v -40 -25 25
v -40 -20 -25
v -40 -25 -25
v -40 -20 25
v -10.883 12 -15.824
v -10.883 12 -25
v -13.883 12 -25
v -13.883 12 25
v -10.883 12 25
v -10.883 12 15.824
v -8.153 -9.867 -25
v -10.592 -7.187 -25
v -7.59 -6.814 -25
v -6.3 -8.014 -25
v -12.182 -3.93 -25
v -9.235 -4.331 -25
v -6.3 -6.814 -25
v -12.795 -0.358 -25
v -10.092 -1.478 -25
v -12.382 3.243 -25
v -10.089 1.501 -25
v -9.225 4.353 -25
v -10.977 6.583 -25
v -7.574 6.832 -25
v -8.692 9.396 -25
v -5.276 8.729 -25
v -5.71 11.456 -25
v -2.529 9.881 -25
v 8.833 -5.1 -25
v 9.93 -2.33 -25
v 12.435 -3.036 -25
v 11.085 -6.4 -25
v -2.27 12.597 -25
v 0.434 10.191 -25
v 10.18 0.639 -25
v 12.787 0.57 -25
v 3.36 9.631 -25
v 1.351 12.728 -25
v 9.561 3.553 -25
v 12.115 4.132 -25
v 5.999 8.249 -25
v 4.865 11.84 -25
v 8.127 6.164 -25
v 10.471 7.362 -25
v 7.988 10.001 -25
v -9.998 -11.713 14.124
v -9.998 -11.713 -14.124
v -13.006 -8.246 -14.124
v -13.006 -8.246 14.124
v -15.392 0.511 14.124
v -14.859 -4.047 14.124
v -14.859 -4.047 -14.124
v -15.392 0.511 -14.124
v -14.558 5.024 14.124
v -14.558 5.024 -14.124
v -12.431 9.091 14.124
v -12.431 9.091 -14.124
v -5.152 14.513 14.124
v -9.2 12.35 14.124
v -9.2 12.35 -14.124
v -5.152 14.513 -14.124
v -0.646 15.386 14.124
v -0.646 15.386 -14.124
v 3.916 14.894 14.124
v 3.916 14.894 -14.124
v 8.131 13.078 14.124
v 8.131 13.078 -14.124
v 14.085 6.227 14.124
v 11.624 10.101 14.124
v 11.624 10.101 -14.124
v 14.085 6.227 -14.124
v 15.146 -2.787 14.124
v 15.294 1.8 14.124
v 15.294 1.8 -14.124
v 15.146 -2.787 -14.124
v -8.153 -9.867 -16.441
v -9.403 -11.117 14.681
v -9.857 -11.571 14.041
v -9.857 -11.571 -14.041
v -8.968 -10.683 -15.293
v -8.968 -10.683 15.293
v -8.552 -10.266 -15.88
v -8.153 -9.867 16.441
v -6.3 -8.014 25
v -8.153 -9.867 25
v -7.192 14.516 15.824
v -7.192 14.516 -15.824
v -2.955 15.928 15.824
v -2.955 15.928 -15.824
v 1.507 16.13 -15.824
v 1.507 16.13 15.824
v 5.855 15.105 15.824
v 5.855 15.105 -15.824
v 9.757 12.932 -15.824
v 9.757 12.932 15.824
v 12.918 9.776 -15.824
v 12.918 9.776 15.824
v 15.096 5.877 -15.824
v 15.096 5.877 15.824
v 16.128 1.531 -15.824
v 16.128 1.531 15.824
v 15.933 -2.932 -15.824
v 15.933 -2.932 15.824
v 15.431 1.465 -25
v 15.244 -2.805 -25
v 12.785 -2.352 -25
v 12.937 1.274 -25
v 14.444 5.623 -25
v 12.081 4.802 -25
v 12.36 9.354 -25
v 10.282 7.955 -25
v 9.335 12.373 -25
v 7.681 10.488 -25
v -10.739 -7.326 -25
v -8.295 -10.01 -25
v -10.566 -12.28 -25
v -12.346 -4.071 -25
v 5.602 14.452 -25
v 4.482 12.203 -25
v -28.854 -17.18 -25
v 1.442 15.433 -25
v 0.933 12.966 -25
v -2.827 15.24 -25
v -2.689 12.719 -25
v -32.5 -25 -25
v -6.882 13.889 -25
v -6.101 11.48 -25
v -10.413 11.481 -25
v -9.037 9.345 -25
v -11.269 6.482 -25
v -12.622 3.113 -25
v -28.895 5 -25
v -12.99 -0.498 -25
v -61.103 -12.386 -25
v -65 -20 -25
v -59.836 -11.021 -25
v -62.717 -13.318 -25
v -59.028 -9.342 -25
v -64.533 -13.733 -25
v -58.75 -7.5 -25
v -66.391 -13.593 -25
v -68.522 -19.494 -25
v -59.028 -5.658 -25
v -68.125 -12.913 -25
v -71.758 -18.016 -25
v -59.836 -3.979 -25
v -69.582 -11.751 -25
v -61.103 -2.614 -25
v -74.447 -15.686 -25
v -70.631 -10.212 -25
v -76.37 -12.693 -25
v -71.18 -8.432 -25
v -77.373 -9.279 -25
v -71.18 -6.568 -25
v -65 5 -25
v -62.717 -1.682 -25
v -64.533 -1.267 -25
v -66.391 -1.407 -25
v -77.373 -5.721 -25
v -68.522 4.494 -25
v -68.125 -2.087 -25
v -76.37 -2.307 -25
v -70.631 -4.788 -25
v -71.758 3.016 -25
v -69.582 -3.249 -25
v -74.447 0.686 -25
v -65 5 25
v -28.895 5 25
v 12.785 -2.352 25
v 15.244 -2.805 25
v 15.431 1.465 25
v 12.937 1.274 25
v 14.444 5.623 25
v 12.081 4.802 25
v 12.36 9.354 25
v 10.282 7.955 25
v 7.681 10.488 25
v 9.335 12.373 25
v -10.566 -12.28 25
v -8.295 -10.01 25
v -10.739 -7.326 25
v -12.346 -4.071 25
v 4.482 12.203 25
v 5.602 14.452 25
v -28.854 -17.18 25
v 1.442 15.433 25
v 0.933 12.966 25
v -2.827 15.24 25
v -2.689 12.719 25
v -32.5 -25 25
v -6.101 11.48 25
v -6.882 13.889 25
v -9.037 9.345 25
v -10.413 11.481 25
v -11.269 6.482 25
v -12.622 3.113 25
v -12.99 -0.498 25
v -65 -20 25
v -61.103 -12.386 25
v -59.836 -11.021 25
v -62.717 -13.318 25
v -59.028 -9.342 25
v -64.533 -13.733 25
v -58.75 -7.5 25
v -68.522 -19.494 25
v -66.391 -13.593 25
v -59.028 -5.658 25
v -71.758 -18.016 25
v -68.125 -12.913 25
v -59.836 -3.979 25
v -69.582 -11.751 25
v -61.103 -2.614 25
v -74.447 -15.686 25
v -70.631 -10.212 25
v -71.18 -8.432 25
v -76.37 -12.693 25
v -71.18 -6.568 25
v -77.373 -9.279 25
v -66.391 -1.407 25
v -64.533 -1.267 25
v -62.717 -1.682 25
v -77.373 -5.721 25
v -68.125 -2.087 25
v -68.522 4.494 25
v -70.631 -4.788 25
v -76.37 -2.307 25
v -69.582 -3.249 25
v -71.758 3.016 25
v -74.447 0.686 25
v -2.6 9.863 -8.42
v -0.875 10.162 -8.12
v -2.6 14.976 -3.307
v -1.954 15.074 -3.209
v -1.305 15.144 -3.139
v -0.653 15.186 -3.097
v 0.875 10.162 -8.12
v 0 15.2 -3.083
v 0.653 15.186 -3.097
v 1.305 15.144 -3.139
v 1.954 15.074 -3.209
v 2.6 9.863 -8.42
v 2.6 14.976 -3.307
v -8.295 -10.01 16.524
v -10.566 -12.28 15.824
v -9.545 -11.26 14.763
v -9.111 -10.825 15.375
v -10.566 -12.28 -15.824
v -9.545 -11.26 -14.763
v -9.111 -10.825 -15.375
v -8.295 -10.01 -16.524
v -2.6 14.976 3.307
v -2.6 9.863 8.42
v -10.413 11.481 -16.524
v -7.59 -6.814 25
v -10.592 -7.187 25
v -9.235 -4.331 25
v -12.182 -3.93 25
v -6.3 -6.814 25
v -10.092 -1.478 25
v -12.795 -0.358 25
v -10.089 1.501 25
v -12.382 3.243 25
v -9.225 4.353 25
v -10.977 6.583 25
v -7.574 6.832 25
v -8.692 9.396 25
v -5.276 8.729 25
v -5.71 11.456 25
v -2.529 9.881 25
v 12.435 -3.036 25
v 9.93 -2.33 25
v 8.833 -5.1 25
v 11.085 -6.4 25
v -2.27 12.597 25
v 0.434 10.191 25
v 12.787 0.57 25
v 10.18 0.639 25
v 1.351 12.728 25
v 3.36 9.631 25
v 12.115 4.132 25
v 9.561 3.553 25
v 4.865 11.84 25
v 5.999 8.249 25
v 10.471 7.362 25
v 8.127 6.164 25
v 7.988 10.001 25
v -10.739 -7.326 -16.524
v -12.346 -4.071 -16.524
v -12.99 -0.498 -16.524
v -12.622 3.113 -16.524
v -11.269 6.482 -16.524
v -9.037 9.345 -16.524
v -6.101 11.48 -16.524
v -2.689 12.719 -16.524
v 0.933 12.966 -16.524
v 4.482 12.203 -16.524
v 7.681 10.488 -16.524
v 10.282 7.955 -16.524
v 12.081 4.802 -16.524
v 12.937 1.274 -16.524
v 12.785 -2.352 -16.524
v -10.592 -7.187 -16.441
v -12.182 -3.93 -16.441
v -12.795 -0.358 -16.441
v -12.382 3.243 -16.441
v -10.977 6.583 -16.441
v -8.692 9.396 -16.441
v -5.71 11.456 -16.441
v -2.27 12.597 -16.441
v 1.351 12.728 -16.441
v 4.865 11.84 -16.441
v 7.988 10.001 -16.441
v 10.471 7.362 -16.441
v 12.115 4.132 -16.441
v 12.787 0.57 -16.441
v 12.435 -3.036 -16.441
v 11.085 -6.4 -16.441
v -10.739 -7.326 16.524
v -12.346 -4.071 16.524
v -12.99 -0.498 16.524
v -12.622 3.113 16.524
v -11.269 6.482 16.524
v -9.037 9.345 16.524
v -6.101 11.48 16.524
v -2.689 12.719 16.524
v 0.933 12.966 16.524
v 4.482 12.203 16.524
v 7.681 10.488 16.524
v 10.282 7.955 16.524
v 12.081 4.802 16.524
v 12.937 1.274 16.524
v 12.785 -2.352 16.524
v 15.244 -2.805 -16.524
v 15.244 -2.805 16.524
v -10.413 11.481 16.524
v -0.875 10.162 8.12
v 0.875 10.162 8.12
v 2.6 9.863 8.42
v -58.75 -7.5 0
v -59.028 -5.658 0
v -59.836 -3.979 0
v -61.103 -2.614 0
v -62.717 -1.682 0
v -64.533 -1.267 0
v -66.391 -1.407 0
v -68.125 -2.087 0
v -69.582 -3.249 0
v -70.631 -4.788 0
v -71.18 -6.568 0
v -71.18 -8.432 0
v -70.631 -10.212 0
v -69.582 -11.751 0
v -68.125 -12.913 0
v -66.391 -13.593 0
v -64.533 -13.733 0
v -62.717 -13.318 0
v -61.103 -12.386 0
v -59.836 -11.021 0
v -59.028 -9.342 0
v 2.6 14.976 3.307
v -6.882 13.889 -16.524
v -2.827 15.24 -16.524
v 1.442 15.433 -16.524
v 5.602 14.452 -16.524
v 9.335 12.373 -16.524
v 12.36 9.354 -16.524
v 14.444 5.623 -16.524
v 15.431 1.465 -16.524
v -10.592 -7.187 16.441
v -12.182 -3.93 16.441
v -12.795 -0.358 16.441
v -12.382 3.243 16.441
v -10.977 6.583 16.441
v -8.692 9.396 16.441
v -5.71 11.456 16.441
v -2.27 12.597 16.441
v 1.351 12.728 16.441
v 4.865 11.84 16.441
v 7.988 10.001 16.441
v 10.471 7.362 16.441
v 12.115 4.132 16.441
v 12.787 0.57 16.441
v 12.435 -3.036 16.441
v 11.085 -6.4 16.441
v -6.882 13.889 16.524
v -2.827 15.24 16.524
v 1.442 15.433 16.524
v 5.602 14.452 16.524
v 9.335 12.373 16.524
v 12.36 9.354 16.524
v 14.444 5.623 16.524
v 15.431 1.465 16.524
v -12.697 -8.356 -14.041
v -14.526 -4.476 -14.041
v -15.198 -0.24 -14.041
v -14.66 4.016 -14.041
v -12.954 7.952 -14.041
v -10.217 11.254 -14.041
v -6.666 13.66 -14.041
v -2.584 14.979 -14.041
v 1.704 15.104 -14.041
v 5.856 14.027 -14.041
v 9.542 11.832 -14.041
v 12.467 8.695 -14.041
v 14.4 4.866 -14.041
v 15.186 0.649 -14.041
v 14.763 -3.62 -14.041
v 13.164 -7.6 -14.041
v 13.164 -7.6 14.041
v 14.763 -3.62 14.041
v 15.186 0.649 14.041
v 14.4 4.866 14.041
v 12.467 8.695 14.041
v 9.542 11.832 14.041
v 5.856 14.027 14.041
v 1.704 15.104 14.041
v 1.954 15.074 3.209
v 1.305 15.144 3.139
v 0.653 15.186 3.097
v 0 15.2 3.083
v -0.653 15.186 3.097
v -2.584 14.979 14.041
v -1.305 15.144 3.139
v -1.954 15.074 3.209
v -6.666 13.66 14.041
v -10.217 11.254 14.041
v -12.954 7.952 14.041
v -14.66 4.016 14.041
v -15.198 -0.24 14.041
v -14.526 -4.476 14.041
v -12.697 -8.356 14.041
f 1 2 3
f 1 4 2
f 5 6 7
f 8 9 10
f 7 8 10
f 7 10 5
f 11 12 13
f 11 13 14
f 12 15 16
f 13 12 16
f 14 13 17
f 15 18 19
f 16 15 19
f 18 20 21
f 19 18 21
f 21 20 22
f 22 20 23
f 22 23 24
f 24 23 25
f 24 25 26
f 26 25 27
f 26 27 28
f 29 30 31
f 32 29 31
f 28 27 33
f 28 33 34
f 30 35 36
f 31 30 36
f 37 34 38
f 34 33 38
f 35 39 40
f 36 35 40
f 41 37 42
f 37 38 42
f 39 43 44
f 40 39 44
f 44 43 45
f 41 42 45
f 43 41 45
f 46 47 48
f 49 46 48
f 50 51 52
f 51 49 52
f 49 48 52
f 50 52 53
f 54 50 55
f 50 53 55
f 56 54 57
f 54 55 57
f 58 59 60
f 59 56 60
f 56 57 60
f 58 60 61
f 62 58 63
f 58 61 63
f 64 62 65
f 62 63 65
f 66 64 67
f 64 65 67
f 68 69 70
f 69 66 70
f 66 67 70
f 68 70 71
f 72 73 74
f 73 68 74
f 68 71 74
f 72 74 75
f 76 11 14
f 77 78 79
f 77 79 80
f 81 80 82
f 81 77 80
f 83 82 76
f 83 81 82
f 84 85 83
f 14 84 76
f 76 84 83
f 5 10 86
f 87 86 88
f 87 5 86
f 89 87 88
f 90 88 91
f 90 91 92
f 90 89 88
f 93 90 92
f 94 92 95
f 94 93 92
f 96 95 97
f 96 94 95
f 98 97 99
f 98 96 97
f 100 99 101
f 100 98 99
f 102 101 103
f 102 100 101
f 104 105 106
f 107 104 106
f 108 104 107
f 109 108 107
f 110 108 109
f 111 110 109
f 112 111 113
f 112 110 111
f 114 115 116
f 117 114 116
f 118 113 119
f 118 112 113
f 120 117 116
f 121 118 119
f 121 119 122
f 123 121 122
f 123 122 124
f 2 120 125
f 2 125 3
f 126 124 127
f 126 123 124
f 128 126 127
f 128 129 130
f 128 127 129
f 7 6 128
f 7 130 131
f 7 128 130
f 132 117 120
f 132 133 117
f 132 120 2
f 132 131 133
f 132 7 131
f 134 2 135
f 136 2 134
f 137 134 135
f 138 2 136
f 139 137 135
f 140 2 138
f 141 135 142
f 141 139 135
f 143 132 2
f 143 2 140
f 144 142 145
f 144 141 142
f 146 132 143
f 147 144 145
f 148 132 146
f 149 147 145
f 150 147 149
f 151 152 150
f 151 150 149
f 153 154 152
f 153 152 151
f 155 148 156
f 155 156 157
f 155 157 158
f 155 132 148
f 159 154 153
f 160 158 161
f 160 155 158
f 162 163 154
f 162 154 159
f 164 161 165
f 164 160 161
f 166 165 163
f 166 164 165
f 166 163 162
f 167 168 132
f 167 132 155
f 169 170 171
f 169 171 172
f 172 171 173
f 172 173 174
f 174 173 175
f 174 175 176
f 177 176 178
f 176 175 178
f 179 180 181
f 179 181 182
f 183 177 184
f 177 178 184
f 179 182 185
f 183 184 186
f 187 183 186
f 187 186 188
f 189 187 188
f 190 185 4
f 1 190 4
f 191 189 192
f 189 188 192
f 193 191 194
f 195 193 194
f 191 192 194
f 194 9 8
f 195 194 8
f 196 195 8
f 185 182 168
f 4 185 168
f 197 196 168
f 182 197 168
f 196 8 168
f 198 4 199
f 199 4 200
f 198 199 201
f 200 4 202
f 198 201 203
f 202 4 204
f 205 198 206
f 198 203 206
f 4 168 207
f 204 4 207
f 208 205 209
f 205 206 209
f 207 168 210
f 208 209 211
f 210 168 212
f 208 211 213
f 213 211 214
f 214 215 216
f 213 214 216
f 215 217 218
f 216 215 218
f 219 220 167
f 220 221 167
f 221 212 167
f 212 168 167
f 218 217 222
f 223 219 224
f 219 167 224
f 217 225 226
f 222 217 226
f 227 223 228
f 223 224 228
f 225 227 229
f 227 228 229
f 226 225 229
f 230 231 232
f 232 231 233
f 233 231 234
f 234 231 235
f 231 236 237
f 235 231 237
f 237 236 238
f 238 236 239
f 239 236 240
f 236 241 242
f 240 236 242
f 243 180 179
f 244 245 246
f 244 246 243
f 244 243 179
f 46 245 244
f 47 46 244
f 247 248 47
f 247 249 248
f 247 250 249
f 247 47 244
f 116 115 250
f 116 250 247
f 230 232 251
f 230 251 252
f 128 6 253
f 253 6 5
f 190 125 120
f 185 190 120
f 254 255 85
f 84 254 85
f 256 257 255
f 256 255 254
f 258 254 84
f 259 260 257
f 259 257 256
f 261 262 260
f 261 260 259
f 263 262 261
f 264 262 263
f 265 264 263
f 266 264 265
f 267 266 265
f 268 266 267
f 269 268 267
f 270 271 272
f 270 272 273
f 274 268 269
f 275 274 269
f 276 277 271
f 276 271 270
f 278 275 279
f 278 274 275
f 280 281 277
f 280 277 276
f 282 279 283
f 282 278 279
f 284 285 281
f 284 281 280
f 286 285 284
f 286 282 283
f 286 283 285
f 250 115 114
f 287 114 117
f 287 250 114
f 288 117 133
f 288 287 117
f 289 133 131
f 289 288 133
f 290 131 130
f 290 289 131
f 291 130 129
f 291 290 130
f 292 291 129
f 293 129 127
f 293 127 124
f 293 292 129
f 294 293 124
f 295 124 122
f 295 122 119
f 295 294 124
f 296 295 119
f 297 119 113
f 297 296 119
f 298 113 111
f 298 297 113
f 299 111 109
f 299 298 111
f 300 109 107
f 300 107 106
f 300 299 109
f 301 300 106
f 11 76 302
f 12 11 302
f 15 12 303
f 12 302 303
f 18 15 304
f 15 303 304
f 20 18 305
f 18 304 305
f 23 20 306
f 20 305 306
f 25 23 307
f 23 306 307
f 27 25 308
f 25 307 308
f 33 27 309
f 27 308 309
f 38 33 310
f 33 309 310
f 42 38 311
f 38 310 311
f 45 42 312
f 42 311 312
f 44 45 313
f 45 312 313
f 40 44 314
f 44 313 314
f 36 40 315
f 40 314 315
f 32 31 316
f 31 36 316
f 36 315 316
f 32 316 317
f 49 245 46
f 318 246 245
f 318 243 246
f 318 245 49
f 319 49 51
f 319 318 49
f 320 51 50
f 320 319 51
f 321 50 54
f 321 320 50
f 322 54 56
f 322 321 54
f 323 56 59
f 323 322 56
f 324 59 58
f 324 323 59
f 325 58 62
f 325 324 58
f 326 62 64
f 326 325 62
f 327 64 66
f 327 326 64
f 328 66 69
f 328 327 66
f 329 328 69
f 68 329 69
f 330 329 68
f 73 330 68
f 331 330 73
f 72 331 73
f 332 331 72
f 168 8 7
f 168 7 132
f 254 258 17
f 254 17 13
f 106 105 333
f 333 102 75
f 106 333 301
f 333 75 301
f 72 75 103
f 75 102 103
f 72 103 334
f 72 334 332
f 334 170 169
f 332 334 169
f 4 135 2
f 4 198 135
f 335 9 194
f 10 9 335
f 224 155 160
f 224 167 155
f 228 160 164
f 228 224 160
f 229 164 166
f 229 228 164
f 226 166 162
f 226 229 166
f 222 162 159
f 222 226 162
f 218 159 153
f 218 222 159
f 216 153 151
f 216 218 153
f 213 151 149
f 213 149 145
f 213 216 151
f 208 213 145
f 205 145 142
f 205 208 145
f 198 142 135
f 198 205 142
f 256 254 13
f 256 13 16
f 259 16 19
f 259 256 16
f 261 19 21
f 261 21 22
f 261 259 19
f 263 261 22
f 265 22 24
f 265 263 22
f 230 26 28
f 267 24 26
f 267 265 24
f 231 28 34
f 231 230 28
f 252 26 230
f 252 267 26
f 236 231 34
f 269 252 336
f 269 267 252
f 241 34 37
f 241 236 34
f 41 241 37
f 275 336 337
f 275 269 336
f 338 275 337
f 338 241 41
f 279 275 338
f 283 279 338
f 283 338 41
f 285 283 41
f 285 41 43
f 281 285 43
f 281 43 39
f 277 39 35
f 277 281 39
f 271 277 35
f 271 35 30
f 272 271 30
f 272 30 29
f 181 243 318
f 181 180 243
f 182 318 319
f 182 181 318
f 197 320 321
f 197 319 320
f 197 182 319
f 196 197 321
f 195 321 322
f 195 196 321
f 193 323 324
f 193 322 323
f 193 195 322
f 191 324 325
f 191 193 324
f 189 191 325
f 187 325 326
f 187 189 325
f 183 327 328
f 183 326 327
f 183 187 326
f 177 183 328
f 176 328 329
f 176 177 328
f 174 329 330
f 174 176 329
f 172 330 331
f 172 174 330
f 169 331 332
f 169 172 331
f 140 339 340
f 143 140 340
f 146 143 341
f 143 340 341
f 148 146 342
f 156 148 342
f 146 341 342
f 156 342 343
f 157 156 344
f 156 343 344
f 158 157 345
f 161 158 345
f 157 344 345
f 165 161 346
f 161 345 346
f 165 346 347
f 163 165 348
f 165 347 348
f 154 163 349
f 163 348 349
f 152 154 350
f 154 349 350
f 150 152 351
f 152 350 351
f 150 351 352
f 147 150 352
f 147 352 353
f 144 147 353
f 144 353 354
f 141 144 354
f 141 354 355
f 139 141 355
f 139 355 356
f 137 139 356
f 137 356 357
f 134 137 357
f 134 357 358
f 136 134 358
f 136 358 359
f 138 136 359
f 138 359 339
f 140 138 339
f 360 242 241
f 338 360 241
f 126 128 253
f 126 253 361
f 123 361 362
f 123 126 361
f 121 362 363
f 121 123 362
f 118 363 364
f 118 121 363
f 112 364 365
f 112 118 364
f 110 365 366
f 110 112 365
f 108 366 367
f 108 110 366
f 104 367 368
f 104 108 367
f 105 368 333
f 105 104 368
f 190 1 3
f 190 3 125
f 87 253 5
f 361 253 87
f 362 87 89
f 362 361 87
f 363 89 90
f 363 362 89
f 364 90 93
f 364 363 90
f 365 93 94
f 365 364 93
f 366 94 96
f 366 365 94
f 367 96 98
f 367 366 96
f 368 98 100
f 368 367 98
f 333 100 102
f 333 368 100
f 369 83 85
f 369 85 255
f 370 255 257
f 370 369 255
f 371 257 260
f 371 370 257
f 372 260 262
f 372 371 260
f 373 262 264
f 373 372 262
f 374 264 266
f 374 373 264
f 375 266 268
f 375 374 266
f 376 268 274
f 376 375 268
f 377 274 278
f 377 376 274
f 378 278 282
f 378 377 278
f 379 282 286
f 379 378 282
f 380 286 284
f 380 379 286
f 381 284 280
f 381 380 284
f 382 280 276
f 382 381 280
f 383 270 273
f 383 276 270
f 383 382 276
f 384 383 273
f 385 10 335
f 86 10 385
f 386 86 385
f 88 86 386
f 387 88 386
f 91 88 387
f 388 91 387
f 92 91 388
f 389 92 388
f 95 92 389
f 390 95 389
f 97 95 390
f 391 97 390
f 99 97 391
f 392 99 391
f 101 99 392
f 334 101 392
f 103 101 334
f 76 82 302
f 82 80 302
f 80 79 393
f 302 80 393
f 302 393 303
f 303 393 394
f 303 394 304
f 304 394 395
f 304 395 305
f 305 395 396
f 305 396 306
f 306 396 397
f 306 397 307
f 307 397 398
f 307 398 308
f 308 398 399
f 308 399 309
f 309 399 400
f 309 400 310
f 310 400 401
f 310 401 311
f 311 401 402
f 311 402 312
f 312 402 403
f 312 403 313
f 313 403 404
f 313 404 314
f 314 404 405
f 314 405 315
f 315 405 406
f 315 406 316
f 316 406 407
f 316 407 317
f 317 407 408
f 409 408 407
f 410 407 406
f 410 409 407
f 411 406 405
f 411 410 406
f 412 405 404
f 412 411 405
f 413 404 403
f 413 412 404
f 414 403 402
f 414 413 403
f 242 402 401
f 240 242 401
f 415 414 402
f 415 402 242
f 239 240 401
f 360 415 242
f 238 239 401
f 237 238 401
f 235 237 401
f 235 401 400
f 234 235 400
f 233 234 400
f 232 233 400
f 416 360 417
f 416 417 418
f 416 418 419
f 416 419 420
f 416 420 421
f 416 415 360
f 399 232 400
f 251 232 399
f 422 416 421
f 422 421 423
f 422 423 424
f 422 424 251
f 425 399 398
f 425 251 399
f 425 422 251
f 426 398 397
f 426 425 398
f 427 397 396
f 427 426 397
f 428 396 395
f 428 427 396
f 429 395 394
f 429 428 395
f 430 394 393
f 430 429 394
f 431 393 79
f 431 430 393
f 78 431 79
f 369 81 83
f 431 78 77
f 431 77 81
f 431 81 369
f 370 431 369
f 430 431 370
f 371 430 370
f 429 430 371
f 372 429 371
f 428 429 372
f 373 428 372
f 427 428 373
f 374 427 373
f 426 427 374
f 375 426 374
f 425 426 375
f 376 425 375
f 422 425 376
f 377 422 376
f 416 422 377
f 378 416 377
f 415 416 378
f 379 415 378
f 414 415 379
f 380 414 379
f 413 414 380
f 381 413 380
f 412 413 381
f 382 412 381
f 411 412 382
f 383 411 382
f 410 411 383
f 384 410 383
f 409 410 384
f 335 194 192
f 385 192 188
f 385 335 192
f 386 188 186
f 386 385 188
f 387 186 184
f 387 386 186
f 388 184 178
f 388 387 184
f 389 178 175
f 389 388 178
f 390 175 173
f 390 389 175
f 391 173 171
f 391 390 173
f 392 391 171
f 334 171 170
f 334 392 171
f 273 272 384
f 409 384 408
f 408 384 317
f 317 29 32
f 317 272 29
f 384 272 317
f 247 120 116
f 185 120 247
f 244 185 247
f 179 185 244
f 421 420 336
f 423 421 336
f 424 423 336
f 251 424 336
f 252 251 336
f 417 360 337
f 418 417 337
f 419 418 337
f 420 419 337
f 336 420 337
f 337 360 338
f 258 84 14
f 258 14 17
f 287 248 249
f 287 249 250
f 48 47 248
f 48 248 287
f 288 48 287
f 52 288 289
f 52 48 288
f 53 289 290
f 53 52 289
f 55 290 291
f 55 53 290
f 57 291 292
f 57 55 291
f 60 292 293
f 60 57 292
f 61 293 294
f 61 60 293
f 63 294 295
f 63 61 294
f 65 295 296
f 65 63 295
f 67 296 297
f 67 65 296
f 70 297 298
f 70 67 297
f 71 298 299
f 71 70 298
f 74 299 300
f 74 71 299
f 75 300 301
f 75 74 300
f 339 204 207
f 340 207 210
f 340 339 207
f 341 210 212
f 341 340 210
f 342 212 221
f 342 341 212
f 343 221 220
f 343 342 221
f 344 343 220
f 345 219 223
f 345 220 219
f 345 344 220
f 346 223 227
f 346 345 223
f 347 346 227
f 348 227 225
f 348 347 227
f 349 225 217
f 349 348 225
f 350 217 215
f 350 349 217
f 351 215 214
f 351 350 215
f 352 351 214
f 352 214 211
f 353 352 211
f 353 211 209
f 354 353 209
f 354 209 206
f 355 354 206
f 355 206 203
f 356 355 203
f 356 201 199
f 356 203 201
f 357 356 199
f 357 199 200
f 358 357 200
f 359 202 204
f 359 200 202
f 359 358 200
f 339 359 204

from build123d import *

# Parameters (mm, degrees)
BOSS_EXTRUDE1_DEPTH     = 25
CUT_EXTRUDE1_DEPTH      = 2.6
CUT_EXTRUDE2_DEPTH      = 26
CUT_EXTRUDE2_DEPTH_BACK = 26
BOSS_EXTRUDE2_DEPTH     = 25
BOSS_EXTRUDE3_START     = -9.175736
BOSS_EXTRUDE3_DEPTH     = 9.175736
SKETCH15_R              = 6.25
CUT_EXTRUDE3_DEPTH      = 26
CUT_EXTRUDE3_DEPTH_BACK = 26
CUT_EXTRUDE4_DEPTH      = 26
CUT_EXTRUDE4_DEPTH_BACK = 26


with BuildPart() as part:
    # Sketch3 → Boss-Extrude1 (new body, symmetric)
    with BuildSketch(Plane.XY):
        with BuildLine():
            Line((6.3, -8.014378278), (9.856597623, -11.570975901))
            ThreePointArc((9.856597623, -11.570975901), (0, 15.2), (-9.856597623, -11.570975901))
            Line((-9.856597623, -11.570975901), (-6.3, -8.014378278))
            Line((-6.3, -8.014378278), (-6.3, -6.814378278))
            Line((-6.3, -6.814378278), (-7.589746286, -6.814378278))
            ThreePointArc((-7.589746286, -6.814378278), (0, 10.2), (7.589746286, -6.814378278))
            Line((7.589746286, -6.814378278), (6.3, -6.814378278))
            Line((6.3, -6.814378278), (6.3, -8.014378278))
        make_face()
    extrude(amount=BOSS_EXTRUDE1_DEPTH, both=True)

    # Sketch4 → Cut-Extrude1 (cut, symmetric)
    with BuildSketch(Plane(origin=(0, 0, 0), x_dir=(0, 0, -1), z_dir=(1, 0, 0))):
        Polygon((-3.082842712, 15.2), (-9.482842712, 8.8), (9.482842712, 8.8), (3.082842712, 15.2), align=None)
    extrude(amount=CUT_EXTRUDE1_DEPTH, both=True, mode=Mode.SUBTRACT)

    # Sketch5 → Cut-Revolve1 (revolve, cut)
    with BuildSketch(Plane(origin=(0, 0, 0), x_dir=(0, 0, -1), z_dir=(1, 0, 0))):
        Polygon((25, 15.2), (25, 12.8), (16.441421356, 12.8), (14.041421356, 15.2), align=None)
    cut_revolve1 = revolve(axis=Axis((0, 0, 27.223610458), (0, 0, -1)), mode=Mode.SUBTRACT)

    # Mirror1: Cut-Revolve1 across plane
    add(cut_revolve1.mirror(Plane.XY), mode=Mode.SUBTRACT)

    # Sketch16 → Cut-Extrude4 (cut, two sides)
    with BuildSketch(Plane.XY) as cut_extrude4_sk:
        with BuildLine():
            Line((0, 0), (13.163586138, -7.6))
            ThreePointArc((13.163586138, -7.6), (7.6, -13.163586138), (0, -15.2))
            Line((0, -15.2), (0, 0))
        make_face()
    extrude(amount=CUT_EXTRUDE4_DEPTH, mode=Mode.SUBTRACT)
    extrude(cut_extrude4_sk.sketch, amount=-CUT_EXTRUDE4_DEPTH_BACK, mode=Mode.SUBTRACT)


with BuildPart() as body_2:
    # Sketch7 → Revolve1 (revolve)
    with BuildSketch(Plane(origin=(0, 0, 0), x_dir=(0, 0, -1), z_dir=(1, 0, 0))):
        Polygon((25, 13), (16.524264069, 13), (14.124264069, 15.4), (3.082842712, 15.4), (-3.082842712, 15.4), (-14.124264069, 15.4), (-16.524264069, 13), (-25, 13), (-25, 15.5), (-16.524264069, 15.5), (-15.824264069, 16.2), (15.824264069, 16.2), (16.524264069, 15.5), (25, 15.5), align=None)
    revolve(axis=Axis((0, 0, 29.952528939), (0, 0, -1)))

    # Sketch10 → Cut-Extrude2 (cut, two sides)
    with BuildSketch(Plane.XY) as cut_extrude2_sk:
        with BuildLine():
            Line((-6.3, -8.014378278), (-9.856597623, -11.570975901))
            Line((-9.856597623, -11.570975901), (-28.285621722, -30))
            Line((-28.285621722, -30), (0, -30))
            ThreePointArc((0, -30), (19.198137256, -23.052798657), (29.504719516, -5.428768394))
            Line((29.504719516, -5.428768394), (0, 0))
            Line((0, 0), (-6.3, -8.014378278))
        make_face()
    extrude(amount=CUT_EXTRUDE2_DEPTH, mode=Mode.SUBTRACT)
    extrude(cut_extrude2_sk.sketch, amount=-CUT_EXTRUDE2_DEPTH_BACK, mode=Mode.SUBTRACT)

    # Sketch12 → Boss-Extrude2 (add, symmetric)
    with BuildSketch(Plane.XY):
        with BuildLine():
            Line((-40, -20), (-40, -25))
            Line((-40, -25), (-32.5, -25))
            Line((-32.5, -25), (-28.853667702, -17.180415152))
            Line((-28.853667702, -17.180415152), (-10.565823895, -12.280202173))
            ThreePointArc((-10.565823895, -12.280202173), (-16.198617819, -0.211614628), (-10.883014288, 12))
            Line((-10.883014288, 12), (-13.883014288, 12))
            Line((-13.883014288, 12), (-28.894562732, 5))
            Line((-28.894562732, 5), (-65, 5))
            ThreePointArc((-65, 5), (-77.5, -7.5), (-65, -20))
            Line((-65, -20), (-40, -20))
        make_face()
    extrude(amount=BOSS_EXTRUDE2_DEPTH, both=True)

    # Sketch13 → Boss-Extrude3 (add)
    with BuildSketch(Plane(origin=(0, 0, -25), x_dir=(-1, 0, 0), z_dir=(0, 0, -1)).offset(BOSS_EXTRUDE3_START)):
        with BuildLine():
            Line((10.883014288, 12), (10.412760585, 11.481481481))
            ThreePointArc((10.412760585, 11.481481481), (15.498312164, -0.228735824), (10.069394352, -11.78377263))
            Line((10.069394352, -11.78377263), (10.565823895, -12.280202173))
            ThreePointArc((10.565823895, -12.280202173), (16.198617819, -0.211614628), (10.883014288, 12))
        make_face()
    boss_extrude3 = extrude(amount=BOSS_EXTRUDE3_DEPTH)

    # Mirror2: Boss-Extrude3 across plane
    add(boss_extrude3.mirror(Plane.XY))

    # Sketch15 → Cut-Extrude3 (cut, two sides)
    with BuildSketch(Plane.XY) as cut_extrude3_sk:
        with Locations((-65, -7.5)):
            Circle(SKETCH15_R)
    extrude(amount=CUT_EXTRUDE3_DEPTH, mode=Mode.SUBTRACT)
    extrude(cut_extrude3_sk.sketch, amount=-CUT_EXTRUDE3_DEPTH_BACK, mode=Mode.SUBTRACT)


solid = Compound([part.part, body_2.part])
